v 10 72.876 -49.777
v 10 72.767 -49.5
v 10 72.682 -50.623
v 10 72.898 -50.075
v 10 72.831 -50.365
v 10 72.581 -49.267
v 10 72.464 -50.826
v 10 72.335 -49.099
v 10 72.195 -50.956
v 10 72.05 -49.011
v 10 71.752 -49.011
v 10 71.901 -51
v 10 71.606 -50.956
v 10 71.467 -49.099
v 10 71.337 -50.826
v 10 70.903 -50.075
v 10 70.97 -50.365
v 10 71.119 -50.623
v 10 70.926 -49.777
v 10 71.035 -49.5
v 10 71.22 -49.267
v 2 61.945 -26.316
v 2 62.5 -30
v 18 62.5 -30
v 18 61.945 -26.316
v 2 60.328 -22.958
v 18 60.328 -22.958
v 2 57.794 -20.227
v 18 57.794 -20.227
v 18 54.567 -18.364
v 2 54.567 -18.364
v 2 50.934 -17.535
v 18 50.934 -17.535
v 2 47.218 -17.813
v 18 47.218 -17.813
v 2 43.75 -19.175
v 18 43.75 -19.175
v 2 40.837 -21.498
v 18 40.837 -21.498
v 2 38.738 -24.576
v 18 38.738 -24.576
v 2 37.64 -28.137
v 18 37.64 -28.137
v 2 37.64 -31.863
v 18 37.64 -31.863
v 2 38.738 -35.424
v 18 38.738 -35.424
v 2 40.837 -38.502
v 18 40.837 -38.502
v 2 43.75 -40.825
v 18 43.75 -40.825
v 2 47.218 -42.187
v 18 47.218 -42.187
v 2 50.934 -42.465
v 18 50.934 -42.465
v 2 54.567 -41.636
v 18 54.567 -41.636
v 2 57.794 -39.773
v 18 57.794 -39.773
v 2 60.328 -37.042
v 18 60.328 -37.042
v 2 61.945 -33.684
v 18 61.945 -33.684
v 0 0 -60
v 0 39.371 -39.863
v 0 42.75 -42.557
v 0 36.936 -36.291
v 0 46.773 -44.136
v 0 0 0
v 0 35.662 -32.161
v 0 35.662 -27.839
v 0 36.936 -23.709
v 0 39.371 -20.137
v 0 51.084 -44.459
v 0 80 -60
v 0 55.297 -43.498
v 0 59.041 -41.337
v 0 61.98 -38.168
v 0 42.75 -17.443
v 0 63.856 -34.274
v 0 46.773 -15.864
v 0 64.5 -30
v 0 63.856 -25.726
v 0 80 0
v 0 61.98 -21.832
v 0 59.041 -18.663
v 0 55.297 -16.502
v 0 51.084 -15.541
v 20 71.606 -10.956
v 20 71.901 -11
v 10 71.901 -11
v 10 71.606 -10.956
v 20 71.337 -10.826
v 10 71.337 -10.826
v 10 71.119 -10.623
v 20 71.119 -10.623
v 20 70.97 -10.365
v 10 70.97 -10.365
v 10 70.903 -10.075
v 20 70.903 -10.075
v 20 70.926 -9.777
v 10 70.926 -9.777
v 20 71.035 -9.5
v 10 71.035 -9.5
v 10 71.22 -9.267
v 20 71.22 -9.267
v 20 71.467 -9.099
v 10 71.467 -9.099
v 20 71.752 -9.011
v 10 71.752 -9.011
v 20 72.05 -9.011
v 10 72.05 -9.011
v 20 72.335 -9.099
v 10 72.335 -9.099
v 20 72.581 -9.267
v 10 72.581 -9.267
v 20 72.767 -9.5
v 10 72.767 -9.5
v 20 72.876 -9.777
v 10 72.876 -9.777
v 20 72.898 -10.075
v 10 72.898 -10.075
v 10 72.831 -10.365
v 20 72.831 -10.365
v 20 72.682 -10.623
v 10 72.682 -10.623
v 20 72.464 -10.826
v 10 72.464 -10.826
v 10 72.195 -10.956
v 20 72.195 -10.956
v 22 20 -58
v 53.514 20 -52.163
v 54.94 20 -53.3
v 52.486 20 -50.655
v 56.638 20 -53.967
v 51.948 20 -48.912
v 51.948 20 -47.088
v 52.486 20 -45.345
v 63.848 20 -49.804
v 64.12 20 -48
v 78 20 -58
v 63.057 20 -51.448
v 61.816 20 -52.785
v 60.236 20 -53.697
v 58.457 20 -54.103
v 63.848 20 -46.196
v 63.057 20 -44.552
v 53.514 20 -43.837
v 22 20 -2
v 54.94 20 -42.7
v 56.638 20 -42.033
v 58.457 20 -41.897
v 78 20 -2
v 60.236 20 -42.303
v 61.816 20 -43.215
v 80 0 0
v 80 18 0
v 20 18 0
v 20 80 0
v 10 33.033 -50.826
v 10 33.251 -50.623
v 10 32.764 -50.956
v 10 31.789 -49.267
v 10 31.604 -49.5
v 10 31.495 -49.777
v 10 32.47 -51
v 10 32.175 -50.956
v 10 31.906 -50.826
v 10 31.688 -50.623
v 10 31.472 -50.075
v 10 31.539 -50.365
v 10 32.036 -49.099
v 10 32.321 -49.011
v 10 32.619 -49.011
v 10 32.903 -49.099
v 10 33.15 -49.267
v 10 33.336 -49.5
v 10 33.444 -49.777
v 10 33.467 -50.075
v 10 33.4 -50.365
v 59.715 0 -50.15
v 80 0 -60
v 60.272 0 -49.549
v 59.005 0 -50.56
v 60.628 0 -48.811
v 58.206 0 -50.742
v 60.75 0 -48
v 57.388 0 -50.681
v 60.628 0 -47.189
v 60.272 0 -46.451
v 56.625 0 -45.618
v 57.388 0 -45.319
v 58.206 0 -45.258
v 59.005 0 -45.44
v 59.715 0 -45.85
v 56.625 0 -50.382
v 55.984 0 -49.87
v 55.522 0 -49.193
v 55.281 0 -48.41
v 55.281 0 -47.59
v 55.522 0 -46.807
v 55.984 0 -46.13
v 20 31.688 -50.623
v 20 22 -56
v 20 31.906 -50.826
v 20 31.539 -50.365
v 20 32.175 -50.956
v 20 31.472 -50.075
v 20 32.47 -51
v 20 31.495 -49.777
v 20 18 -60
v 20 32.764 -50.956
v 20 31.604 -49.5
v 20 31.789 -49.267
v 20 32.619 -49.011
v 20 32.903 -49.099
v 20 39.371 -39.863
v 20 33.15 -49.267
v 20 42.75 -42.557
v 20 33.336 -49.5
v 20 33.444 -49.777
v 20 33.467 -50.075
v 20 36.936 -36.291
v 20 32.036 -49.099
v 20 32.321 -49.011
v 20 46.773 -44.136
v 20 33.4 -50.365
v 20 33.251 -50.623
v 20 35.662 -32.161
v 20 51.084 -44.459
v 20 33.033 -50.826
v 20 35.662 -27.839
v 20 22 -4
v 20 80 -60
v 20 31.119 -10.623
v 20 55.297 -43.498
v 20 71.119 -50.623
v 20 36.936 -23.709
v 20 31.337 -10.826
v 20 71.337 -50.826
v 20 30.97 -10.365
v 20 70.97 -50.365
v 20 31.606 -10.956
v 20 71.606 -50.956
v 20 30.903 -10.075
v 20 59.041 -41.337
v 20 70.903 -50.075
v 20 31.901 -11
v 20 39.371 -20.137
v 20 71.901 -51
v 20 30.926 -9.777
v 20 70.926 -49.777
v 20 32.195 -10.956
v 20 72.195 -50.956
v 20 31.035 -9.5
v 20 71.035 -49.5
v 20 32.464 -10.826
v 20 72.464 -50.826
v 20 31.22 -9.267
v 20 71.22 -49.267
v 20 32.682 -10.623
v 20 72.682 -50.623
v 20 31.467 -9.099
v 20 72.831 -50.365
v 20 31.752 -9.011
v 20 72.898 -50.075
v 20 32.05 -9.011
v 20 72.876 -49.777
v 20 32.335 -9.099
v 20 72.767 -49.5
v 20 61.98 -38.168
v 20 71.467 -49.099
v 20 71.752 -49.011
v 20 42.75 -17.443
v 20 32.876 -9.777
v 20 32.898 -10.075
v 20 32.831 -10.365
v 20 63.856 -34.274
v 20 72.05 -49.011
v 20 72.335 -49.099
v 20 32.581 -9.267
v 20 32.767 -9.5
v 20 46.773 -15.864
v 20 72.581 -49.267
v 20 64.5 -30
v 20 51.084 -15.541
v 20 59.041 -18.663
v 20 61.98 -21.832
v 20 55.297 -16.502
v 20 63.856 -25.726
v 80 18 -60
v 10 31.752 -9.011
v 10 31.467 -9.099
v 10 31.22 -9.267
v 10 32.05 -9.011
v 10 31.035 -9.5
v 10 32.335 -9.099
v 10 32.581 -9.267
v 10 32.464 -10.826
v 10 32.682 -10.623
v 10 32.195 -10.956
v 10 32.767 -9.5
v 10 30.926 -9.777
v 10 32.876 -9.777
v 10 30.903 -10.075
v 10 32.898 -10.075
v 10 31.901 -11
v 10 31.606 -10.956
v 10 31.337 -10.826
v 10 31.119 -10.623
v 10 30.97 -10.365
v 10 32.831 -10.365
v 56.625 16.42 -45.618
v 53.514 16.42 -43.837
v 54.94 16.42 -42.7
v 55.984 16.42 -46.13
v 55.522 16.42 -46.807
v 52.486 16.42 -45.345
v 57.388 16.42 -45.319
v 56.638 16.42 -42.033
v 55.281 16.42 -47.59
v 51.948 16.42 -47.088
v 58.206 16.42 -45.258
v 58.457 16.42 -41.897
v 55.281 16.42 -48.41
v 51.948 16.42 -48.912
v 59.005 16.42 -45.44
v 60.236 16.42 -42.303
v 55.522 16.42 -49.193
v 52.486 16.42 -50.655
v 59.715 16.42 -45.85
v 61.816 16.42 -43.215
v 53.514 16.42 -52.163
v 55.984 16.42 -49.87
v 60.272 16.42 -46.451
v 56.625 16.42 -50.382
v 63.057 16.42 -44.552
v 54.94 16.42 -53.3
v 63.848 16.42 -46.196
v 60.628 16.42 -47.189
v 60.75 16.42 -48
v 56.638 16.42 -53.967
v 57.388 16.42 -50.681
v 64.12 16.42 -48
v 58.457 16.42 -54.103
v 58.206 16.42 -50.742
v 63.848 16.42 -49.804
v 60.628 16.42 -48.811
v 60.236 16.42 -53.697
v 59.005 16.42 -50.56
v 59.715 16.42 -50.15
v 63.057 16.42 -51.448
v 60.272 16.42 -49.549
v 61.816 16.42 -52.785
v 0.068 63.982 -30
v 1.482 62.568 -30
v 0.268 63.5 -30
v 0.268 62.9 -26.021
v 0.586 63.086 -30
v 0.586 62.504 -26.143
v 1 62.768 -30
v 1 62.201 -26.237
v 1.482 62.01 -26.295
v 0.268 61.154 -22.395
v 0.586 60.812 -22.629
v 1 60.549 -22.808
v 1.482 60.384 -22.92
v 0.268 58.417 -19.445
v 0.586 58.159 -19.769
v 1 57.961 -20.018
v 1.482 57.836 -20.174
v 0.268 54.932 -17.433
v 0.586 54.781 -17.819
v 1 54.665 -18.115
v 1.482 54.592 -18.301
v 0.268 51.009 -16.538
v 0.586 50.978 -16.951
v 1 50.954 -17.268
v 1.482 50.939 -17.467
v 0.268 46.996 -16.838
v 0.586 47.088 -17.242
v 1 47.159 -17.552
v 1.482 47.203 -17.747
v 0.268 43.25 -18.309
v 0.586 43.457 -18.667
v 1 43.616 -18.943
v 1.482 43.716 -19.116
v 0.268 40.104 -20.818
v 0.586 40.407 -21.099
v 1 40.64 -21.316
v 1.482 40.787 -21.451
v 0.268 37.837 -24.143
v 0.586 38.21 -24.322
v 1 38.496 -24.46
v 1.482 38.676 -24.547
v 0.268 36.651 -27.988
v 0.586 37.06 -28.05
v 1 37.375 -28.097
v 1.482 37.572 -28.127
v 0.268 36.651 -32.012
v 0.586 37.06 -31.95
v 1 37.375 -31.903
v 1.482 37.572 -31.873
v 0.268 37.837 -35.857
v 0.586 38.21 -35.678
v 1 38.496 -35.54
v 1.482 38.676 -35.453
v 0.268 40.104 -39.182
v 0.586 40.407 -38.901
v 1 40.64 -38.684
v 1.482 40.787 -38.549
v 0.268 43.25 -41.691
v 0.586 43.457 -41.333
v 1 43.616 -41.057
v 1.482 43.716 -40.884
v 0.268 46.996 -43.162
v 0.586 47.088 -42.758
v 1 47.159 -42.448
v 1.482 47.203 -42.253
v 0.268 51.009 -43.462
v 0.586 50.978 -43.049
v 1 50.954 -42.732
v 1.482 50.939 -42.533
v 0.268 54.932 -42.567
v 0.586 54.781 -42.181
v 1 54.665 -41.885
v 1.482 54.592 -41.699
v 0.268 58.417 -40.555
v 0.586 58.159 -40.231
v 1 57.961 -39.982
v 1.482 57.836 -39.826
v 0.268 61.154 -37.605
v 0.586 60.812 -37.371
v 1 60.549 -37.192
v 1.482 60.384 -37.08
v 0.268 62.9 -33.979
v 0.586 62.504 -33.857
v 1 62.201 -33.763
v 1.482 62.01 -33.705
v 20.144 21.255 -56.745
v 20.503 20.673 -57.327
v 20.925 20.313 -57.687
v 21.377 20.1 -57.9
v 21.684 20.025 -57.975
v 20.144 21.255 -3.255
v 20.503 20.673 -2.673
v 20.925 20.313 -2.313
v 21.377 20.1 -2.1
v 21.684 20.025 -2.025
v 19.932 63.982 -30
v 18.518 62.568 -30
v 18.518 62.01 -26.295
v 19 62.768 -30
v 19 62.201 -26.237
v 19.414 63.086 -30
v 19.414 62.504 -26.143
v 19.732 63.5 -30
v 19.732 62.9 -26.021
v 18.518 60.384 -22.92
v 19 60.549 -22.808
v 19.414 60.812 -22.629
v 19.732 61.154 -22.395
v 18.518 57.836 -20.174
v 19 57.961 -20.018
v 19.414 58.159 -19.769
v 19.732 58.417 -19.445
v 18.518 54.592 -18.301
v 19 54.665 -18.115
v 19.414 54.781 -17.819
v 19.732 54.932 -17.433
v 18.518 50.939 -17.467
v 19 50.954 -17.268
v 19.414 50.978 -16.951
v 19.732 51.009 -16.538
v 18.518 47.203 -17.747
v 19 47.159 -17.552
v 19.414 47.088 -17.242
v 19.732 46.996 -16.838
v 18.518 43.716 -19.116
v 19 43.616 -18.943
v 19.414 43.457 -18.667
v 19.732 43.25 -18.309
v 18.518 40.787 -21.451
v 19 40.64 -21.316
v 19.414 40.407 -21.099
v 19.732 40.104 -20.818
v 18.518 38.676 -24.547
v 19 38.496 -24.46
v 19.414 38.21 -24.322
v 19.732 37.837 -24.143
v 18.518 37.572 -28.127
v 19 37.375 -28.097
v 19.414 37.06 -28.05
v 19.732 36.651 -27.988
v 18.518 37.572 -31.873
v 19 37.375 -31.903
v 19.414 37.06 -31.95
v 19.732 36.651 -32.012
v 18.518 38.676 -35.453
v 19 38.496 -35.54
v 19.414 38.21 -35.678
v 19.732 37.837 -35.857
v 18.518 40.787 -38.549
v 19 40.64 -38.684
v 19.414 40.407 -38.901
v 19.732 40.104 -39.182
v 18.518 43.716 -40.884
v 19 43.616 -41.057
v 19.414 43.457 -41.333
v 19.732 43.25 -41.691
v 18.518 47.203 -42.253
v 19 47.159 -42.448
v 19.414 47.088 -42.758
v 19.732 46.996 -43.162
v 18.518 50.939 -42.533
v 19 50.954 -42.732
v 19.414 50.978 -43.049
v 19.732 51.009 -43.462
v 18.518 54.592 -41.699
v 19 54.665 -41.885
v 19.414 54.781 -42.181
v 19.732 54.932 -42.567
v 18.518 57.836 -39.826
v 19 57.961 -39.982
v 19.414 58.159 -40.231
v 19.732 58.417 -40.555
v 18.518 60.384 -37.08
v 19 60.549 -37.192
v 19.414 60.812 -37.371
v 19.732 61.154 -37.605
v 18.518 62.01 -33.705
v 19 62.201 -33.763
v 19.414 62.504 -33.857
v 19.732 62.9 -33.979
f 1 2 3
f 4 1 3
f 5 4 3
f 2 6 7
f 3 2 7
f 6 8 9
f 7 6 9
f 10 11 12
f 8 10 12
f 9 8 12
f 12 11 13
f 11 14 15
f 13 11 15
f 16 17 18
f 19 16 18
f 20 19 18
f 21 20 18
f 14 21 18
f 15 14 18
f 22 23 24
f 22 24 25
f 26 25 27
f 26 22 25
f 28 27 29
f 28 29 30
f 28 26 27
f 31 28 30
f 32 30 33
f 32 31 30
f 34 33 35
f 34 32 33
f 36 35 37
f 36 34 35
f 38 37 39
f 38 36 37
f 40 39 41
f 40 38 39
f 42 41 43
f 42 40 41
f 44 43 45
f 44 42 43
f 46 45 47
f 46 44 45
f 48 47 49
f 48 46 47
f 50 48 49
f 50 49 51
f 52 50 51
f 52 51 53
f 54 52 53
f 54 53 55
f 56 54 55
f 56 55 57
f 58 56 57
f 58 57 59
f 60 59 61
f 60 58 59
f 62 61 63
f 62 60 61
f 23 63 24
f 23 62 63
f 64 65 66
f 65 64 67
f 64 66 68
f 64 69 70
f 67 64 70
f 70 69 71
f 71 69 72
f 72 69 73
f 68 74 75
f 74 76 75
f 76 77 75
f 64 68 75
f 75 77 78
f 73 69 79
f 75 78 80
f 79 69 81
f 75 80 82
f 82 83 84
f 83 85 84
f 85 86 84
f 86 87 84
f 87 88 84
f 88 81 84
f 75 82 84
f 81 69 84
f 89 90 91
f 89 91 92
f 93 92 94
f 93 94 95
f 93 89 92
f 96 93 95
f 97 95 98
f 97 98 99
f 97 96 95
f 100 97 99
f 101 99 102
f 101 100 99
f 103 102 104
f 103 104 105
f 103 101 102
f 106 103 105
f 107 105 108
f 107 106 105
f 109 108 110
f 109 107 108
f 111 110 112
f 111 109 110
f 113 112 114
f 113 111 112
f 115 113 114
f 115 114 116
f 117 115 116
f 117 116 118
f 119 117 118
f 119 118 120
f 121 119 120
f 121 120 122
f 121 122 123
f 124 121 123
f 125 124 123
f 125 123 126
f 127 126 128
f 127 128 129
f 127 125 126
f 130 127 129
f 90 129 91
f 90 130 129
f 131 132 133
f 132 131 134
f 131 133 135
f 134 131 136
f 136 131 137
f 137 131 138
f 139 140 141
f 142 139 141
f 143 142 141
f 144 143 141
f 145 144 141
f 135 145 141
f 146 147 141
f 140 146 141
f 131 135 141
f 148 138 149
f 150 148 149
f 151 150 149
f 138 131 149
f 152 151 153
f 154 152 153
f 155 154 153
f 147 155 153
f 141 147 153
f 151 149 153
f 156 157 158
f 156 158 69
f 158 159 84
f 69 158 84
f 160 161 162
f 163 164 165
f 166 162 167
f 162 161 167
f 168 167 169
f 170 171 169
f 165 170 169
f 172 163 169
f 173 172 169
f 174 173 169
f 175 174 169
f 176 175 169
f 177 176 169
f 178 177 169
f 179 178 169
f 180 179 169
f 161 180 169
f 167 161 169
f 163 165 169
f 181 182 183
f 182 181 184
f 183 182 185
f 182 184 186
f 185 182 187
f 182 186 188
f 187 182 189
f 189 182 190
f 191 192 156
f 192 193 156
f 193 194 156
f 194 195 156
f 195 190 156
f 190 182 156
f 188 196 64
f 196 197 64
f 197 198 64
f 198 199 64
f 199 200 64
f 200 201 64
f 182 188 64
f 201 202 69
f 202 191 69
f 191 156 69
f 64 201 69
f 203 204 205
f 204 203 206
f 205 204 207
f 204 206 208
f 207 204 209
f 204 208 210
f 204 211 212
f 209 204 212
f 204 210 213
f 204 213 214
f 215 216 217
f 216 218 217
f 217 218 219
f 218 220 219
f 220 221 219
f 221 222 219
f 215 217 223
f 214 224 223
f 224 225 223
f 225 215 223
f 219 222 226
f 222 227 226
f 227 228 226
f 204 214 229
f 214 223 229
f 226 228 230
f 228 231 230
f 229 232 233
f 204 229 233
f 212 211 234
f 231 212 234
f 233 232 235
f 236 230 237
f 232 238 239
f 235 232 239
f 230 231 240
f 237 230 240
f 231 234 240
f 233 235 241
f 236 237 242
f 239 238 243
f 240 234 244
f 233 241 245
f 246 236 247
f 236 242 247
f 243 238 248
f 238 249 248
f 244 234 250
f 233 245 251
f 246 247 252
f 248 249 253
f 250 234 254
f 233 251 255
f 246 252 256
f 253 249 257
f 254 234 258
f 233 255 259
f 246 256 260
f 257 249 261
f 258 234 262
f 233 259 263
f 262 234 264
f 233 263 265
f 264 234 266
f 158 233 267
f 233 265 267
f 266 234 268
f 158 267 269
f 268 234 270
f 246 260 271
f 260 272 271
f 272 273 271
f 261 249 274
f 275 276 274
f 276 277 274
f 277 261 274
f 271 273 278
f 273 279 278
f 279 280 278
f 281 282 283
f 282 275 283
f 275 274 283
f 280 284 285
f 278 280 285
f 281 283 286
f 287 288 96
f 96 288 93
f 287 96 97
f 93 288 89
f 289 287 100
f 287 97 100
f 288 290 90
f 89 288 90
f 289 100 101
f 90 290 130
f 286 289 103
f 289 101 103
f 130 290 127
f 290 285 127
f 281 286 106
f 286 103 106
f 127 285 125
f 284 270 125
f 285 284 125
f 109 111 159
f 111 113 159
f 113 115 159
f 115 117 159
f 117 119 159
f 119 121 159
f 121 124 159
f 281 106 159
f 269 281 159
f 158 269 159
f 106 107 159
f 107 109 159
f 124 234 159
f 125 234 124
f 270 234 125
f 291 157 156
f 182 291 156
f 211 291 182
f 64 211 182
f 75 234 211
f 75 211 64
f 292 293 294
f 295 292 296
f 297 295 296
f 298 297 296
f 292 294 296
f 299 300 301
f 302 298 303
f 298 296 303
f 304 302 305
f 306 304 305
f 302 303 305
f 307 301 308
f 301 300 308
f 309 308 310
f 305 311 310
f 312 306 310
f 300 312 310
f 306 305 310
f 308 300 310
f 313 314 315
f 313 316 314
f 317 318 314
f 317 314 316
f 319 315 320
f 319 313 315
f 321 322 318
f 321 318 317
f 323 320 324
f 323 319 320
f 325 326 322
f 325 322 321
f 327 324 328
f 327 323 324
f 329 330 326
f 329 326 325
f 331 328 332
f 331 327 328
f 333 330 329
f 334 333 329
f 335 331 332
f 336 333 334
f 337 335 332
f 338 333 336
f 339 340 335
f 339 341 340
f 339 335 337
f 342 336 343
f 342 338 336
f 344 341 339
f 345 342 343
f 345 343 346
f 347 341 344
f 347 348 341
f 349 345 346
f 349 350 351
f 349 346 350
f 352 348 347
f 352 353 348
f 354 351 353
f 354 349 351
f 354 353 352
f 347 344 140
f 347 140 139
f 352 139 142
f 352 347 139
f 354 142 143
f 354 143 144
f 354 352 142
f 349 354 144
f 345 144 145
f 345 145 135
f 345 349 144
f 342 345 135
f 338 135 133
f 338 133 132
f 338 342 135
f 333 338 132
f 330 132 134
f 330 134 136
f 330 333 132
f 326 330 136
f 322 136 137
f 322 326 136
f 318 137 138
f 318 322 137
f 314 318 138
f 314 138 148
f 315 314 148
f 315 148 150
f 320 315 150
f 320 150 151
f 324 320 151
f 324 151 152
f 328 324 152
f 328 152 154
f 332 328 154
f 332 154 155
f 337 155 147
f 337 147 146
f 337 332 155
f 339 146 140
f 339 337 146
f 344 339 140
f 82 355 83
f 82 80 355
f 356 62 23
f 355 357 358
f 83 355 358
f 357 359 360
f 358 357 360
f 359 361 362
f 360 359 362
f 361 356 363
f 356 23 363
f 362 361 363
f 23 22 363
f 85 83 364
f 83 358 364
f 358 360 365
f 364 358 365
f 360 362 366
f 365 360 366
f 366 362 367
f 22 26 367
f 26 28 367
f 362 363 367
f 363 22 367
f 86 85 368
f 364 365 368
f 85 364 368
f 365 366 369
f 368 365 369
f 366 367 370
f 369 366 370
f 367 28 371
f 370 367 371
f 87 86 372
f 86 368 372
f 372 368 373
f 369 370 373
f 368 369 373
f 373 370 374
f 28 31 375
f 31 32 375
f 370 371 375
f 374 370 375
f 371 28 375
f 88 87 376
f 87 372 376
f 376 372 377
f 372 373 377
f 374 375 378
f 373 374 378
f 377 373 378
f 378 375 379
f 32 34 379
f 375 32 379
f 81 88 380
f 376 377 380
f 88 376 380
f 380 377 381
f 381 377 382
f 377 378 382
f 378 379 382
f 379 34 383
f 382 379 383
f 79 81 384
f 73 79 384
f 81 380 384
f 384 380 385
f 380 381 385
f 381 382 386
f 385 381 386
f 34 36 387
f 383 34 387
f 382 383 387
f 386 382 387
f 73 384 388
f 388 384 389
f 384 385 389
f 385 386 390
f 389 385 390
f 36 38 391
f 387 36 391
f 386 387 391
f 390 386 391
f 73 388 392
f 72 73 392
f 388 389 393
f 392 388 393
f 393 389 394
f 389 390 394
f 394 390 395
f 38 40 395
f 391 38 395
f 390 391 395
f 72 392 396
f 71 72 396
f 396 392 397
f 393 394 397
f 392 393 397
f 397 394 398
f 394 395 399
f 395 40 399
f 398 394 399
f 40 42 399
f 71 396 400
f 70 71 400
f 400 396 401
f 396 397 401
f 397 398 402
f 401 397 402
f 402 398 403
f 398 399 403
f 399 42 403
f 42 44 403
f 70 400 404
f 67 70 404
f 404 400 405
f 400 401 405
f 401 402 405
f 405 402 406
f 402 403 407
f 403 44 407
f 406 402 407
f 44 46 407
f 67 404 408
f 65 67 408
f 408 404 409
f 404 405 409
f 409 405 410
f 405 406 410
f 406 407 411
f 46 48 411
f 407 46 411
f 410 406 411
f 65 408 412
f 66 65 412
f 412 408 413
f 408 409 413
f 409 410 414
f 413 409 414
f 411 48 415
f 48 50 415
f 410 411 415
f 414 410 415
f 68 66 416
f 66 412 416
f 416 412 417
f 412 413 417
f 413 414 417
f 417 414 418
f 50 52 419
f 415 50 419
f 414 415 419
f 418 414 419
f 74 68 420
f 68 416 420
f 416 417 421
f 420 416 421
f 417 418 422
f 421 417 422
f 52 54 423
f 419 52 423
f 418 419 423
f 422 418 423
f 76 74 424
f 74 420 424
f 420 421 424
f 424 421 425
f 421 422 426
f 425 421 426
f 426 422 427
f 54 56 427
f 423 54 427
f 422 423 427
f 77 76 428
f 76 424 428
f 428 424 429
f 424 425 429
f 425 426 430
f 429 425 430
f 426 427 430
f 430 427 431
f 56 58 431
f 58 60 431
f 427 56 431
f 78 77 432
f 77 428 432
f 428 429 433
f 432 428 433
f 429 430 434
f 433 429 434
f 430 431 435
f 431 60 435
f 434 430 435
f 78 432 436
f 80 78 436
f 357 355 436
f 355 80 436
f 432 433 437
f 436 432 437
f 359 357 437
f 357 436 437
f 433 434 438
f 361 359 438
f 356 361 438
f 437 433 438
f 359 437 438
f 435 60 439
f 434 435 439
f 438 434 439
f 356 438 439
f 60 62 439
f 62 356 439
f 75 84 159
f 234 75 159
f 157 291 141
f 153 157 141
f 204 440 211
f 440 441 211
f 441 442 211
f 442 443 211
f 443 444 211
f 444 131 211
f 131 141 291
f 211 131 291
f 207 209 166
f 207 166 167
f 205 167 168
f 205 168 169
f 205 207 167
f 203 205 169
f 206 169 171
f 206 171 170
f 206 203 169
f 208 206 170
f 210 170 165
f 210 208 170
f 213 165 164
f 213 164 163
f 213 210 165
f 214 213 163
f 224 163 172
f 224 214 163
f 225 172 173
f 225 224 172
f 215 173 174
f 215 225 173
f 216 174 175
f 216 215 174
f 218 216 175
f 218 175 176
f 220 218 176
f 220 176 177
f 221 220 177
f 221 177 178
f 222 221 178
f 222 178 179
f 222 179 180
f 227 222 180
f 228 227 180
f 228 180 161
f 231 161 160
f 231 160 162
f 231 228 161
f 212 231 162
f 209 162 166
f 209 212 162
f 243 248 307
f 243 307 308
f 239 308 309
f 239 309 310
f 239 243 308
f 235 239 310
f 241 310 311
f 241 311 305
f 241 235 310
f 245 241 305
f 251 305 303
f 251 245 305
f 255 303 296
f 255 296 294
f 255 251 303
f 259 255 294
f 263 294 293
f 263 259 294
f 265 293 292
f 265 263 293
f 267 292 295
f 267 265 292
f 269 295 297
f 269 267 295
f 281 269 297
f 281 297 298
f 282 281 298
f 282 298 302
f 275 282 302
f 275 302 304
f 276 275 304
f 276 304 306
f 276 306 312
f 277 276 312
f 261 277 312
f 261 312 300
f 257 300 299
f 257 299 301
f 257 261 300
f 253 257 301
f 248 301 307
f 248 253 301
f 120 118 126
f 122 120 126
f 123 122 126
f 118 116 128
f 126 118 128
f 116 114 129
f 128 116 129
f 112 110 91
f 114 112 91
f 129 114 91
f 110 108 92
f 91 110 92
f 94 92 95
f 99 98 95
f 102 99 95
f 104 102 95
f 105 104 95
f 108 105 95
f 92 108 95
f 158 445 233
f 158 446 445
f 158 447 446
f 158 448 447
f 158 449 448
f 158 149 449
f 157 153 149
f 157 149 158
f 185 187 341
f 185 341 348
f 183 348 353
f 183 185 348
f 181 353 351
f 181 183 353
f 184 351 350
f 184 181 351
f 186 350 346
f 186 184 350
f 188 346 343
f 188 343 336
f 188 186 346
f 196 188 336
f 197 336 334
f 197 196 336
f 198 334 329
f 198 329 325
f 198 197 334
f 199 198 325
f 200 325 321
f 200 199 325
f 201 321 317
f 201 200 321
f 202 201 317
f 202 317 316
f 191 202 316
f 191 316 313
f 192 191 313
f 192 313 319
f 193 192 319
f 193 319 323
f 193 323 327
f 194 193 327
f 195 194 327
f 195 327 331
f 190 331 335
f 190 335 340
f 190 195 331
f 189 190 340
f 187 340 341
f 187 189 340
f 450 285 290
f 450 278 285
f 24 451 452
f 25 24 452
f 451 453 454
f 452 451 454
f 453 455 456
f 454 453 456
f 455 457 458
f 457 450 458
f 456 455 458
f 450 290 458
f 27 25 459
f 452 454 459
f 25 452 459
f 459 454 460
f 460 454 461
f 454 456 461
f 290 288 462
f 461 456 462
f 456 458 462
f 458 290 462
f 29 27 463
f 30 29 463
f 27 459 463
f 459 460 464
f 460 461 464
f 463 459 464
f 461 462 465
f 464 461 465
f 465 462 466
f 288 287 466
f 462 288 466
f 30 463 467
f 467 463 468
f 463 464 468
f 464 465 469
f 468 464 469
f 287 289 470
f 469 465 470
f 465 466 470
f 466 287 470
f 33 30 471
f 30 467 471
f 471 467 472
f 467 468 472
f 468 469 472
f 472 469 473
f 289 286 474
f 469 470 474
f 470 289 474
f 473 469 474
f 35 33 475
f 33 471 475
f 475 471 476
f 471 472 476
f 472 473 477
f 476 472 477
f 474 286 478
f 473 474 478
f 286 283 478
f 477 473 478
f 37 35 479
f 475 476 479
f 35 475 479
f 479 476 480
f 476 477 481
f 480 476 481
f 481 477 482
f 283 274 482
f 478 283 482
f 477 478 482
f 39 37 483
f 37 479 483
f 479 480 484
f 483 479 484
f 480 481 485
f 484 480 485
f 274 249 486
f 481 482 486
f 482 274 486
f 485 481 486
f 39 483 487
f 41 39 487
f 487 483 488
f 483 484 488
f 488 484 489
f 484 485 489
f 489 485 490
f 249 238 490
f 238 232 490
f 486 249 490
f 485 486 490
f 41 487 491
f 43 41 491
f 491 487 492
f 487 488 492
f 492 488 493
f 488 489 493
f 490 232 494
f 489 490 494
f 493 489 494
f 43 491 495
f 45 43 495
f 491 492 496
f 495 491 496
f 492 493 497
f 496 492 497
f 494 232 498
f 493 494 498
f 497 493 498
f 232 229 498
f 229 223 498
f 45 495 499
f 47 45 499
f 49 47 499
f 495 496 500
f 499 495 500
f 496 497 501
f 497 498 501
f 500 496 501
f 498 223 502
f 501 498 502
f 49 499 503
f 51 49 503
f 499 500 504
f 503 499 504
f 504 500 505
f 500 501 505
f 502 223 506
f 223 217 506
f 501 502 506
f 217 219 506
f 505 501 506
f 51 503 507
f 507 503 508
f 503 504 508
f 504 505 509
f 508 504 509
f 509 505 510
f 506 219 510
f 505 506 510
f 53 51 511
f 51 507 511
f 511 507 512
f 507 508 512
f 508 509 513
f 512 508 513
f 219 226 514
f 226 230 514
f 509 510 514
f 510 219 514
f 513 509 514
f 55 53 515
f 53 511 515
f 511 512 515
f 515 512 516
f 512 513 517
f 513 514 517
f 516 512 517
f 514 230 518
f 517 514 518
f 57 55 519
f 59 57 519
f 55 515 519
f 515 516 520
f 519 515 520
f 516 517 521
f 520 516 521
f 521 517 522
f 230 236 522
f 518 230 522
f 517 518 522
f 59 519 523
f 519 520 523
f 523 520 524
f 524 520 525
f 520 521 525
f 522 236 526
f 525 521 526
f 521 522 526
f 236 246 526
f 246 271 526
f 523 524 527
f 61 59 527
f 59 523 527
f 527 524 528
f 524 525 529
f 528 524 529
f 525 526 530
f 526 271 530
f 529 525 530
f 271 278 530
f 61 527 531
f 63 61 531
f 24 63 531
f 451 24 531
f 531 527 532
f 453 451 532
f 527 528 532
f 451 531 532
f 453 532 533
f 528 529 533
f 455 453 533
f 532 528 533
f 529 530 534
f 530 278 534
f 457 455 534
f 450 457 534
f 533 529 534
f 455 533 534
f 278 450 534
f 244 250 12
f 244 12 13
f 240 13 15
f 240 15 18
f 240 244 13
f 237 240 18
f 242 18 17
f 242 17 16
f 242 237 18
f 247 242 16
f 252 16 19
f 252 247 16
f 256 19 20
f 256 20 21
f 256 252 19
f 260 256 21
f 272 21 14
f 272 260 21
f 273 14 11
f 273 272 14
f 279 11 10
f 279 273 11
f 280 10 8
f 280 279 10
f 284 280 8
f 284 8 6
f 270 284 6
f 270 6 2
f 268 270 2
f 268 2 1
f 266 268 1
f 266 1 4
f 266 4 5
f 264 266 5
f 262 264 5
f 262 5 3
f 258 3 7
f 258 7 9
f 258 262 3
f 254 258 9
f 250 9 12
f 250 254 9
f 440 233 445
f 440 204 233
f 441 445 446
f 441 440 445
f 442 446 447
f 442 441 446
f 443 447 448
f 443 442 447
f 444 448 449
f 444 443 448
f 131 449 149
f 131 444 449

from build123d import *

# Parameters (mm, degrees)
BOSS_EXTRUDE1_DEPTH    = 60
F_3DSKETCH1_R          = 1
CUT_EXTRUDE1_DEPTH     = 10
CUT_EXTRUDE3_OUTLINE_R = 12.5
CUT_EXTRUDE3_DEPTH     = 20
FILLET1_R              = 2
CUT_EXTRUDE4_DEPTH     = 60
FILLET2_R              = 2
CUT_EXTRUDE5_DEPTH     = 60
CUT_EXTRUDE8_START     = 16.42
CUT_EXTRUDE8_OUTLINE_R = 6.12
CUT_EXTRUDE8_DEPTH     = 3.58
CUT_EXTRUDE9_OUTLINE_R = 2.75
CUT_EXTRUDE9_DEPTH     = 16.42


# Read off the part's stored shape, not the designer's step: Cut-Extrude3, Cut-Extrude8, Cut-Extrude9
with BuildPart() as part:
    # Sketch1 → Boss-Extrude1 (new body)
    with BuildSketch(Plane.XY):
        Polygon((0, 0), (0, 80), (20, 80), (20, 20), (80, 20), (80, 0), align=None)
    extrude(amount=-BOSS_EXTRUDE1_DEPTH)

    # 3DSketch1 → Cut-Extrude1 (cut)
    with BuildSketch(Plane(origin=(20, 71.90061973, -50), x_dir=(0, -0.7071067811865477, 0.7071067811865475), z_dir=(-1, 0, 0))):
        with Locations(Location((0, 0, 0), (0, 0, 225))):
            Circle(F_3DSKETCH1_R)
        with Locations(Location((28.284271247, 28.284271247, 0), (0, 0, 225))):
            Circle(F_3DSKETCH1_R)
        with Locations(Location((27.881964101, -27.881964101, 0), (0, 0, 225))):
            Circle(F_3DSKETCH1_R)
        with Locations(Location((56.568542495, 0, 0), (0, 0, 225))):
            Circle(F_3DSKETCH1_R)
    extrude(amount=CUT_EXTRUDE1_DEPTH, mode=Mode.SUBTRACT)

    # Cut-Extrude3 outline → Cut-Extrude3 (cut)
    with BuildSketch(Plane.YZ):
        with Locations((50, -30)):
            Circle(CUT_EXTRUDE3_OUTLINE_R)
    extrude(amount=CUT_EXTRUDE3_DEPTH, mode=Mode.SUBTRACT)

    # Fillet1
    fillet1_edges = [part.edges().sort_by_distance(p)[0] for p in [
        (20, 37.5, -30),
        (0, 37.5, -30),
    ]]
    fillet(fillet1_edges, radius=FILLET1_R)

    # Sketch7 → Cut-Extrude4 (cut)
    with BuildSketch(Plane(origin=(80, 0, 0), x_dir=(0, 0, -1), z_dir=(1, 0, 0))):
        Polygon((0, 20), (2, 20), (0, 18), align=None)
        Polygon((60, 20), (58, 20), (60, 18), align=None)
    extrude(amount=-CUT_EXTRUDE4_DEPTH, mode=Mode.SUBTRACT)

    # Fillet2
    fillet2_edges = [part.edges().sort_by_distance(p)[0] for p in [
        (20, 20, -30),
    ]]
    fillet(fillet2_edges, radius=FILLET2_R)

    # Sketch8 → Cut-Extrude5 (cut)
    with BuildSketch(Plane.XY):
        Polygon((78, 20), (80, 20), (80, 18), align=None)
    extrude(amount=-CUT_EXTRUDE5_DEPTH, mode=Mode.SUBTRACT)

    # Cut-Extrude8 outline → Cut-Extrude8 (cut)
    with BuildSketch(Plane(origin=(0, 0, 0), x_dir=(1, 0, 0), z_dir=(0, 1, 0)).offset(CUT_EXTRUDE8_START)):
        with Locations((58, 48)):
            Circle(CUT_EXTRUDE8_OUTLINE_R)
    extrude(amount=CUT_EXTRUDE8_DEPTH, mode=Mode.SUBTRACT)

    # Cut-Extrude9 outline → Cut-Extrude9 (cut)
    with BuildSketch(Plane(origin=(0, 0, 0), x_dir=(1, 0, 0), z_dir=(0, 1, 0))):
        with Locations((58, 48)):
            Circle(CUT_EXTRUDE9_OUTLINE_R)
    extrude(amount=CUT_EXTRUDE9_DEPTH, mode=Mode.SUBTRACT)


solid = part.part
